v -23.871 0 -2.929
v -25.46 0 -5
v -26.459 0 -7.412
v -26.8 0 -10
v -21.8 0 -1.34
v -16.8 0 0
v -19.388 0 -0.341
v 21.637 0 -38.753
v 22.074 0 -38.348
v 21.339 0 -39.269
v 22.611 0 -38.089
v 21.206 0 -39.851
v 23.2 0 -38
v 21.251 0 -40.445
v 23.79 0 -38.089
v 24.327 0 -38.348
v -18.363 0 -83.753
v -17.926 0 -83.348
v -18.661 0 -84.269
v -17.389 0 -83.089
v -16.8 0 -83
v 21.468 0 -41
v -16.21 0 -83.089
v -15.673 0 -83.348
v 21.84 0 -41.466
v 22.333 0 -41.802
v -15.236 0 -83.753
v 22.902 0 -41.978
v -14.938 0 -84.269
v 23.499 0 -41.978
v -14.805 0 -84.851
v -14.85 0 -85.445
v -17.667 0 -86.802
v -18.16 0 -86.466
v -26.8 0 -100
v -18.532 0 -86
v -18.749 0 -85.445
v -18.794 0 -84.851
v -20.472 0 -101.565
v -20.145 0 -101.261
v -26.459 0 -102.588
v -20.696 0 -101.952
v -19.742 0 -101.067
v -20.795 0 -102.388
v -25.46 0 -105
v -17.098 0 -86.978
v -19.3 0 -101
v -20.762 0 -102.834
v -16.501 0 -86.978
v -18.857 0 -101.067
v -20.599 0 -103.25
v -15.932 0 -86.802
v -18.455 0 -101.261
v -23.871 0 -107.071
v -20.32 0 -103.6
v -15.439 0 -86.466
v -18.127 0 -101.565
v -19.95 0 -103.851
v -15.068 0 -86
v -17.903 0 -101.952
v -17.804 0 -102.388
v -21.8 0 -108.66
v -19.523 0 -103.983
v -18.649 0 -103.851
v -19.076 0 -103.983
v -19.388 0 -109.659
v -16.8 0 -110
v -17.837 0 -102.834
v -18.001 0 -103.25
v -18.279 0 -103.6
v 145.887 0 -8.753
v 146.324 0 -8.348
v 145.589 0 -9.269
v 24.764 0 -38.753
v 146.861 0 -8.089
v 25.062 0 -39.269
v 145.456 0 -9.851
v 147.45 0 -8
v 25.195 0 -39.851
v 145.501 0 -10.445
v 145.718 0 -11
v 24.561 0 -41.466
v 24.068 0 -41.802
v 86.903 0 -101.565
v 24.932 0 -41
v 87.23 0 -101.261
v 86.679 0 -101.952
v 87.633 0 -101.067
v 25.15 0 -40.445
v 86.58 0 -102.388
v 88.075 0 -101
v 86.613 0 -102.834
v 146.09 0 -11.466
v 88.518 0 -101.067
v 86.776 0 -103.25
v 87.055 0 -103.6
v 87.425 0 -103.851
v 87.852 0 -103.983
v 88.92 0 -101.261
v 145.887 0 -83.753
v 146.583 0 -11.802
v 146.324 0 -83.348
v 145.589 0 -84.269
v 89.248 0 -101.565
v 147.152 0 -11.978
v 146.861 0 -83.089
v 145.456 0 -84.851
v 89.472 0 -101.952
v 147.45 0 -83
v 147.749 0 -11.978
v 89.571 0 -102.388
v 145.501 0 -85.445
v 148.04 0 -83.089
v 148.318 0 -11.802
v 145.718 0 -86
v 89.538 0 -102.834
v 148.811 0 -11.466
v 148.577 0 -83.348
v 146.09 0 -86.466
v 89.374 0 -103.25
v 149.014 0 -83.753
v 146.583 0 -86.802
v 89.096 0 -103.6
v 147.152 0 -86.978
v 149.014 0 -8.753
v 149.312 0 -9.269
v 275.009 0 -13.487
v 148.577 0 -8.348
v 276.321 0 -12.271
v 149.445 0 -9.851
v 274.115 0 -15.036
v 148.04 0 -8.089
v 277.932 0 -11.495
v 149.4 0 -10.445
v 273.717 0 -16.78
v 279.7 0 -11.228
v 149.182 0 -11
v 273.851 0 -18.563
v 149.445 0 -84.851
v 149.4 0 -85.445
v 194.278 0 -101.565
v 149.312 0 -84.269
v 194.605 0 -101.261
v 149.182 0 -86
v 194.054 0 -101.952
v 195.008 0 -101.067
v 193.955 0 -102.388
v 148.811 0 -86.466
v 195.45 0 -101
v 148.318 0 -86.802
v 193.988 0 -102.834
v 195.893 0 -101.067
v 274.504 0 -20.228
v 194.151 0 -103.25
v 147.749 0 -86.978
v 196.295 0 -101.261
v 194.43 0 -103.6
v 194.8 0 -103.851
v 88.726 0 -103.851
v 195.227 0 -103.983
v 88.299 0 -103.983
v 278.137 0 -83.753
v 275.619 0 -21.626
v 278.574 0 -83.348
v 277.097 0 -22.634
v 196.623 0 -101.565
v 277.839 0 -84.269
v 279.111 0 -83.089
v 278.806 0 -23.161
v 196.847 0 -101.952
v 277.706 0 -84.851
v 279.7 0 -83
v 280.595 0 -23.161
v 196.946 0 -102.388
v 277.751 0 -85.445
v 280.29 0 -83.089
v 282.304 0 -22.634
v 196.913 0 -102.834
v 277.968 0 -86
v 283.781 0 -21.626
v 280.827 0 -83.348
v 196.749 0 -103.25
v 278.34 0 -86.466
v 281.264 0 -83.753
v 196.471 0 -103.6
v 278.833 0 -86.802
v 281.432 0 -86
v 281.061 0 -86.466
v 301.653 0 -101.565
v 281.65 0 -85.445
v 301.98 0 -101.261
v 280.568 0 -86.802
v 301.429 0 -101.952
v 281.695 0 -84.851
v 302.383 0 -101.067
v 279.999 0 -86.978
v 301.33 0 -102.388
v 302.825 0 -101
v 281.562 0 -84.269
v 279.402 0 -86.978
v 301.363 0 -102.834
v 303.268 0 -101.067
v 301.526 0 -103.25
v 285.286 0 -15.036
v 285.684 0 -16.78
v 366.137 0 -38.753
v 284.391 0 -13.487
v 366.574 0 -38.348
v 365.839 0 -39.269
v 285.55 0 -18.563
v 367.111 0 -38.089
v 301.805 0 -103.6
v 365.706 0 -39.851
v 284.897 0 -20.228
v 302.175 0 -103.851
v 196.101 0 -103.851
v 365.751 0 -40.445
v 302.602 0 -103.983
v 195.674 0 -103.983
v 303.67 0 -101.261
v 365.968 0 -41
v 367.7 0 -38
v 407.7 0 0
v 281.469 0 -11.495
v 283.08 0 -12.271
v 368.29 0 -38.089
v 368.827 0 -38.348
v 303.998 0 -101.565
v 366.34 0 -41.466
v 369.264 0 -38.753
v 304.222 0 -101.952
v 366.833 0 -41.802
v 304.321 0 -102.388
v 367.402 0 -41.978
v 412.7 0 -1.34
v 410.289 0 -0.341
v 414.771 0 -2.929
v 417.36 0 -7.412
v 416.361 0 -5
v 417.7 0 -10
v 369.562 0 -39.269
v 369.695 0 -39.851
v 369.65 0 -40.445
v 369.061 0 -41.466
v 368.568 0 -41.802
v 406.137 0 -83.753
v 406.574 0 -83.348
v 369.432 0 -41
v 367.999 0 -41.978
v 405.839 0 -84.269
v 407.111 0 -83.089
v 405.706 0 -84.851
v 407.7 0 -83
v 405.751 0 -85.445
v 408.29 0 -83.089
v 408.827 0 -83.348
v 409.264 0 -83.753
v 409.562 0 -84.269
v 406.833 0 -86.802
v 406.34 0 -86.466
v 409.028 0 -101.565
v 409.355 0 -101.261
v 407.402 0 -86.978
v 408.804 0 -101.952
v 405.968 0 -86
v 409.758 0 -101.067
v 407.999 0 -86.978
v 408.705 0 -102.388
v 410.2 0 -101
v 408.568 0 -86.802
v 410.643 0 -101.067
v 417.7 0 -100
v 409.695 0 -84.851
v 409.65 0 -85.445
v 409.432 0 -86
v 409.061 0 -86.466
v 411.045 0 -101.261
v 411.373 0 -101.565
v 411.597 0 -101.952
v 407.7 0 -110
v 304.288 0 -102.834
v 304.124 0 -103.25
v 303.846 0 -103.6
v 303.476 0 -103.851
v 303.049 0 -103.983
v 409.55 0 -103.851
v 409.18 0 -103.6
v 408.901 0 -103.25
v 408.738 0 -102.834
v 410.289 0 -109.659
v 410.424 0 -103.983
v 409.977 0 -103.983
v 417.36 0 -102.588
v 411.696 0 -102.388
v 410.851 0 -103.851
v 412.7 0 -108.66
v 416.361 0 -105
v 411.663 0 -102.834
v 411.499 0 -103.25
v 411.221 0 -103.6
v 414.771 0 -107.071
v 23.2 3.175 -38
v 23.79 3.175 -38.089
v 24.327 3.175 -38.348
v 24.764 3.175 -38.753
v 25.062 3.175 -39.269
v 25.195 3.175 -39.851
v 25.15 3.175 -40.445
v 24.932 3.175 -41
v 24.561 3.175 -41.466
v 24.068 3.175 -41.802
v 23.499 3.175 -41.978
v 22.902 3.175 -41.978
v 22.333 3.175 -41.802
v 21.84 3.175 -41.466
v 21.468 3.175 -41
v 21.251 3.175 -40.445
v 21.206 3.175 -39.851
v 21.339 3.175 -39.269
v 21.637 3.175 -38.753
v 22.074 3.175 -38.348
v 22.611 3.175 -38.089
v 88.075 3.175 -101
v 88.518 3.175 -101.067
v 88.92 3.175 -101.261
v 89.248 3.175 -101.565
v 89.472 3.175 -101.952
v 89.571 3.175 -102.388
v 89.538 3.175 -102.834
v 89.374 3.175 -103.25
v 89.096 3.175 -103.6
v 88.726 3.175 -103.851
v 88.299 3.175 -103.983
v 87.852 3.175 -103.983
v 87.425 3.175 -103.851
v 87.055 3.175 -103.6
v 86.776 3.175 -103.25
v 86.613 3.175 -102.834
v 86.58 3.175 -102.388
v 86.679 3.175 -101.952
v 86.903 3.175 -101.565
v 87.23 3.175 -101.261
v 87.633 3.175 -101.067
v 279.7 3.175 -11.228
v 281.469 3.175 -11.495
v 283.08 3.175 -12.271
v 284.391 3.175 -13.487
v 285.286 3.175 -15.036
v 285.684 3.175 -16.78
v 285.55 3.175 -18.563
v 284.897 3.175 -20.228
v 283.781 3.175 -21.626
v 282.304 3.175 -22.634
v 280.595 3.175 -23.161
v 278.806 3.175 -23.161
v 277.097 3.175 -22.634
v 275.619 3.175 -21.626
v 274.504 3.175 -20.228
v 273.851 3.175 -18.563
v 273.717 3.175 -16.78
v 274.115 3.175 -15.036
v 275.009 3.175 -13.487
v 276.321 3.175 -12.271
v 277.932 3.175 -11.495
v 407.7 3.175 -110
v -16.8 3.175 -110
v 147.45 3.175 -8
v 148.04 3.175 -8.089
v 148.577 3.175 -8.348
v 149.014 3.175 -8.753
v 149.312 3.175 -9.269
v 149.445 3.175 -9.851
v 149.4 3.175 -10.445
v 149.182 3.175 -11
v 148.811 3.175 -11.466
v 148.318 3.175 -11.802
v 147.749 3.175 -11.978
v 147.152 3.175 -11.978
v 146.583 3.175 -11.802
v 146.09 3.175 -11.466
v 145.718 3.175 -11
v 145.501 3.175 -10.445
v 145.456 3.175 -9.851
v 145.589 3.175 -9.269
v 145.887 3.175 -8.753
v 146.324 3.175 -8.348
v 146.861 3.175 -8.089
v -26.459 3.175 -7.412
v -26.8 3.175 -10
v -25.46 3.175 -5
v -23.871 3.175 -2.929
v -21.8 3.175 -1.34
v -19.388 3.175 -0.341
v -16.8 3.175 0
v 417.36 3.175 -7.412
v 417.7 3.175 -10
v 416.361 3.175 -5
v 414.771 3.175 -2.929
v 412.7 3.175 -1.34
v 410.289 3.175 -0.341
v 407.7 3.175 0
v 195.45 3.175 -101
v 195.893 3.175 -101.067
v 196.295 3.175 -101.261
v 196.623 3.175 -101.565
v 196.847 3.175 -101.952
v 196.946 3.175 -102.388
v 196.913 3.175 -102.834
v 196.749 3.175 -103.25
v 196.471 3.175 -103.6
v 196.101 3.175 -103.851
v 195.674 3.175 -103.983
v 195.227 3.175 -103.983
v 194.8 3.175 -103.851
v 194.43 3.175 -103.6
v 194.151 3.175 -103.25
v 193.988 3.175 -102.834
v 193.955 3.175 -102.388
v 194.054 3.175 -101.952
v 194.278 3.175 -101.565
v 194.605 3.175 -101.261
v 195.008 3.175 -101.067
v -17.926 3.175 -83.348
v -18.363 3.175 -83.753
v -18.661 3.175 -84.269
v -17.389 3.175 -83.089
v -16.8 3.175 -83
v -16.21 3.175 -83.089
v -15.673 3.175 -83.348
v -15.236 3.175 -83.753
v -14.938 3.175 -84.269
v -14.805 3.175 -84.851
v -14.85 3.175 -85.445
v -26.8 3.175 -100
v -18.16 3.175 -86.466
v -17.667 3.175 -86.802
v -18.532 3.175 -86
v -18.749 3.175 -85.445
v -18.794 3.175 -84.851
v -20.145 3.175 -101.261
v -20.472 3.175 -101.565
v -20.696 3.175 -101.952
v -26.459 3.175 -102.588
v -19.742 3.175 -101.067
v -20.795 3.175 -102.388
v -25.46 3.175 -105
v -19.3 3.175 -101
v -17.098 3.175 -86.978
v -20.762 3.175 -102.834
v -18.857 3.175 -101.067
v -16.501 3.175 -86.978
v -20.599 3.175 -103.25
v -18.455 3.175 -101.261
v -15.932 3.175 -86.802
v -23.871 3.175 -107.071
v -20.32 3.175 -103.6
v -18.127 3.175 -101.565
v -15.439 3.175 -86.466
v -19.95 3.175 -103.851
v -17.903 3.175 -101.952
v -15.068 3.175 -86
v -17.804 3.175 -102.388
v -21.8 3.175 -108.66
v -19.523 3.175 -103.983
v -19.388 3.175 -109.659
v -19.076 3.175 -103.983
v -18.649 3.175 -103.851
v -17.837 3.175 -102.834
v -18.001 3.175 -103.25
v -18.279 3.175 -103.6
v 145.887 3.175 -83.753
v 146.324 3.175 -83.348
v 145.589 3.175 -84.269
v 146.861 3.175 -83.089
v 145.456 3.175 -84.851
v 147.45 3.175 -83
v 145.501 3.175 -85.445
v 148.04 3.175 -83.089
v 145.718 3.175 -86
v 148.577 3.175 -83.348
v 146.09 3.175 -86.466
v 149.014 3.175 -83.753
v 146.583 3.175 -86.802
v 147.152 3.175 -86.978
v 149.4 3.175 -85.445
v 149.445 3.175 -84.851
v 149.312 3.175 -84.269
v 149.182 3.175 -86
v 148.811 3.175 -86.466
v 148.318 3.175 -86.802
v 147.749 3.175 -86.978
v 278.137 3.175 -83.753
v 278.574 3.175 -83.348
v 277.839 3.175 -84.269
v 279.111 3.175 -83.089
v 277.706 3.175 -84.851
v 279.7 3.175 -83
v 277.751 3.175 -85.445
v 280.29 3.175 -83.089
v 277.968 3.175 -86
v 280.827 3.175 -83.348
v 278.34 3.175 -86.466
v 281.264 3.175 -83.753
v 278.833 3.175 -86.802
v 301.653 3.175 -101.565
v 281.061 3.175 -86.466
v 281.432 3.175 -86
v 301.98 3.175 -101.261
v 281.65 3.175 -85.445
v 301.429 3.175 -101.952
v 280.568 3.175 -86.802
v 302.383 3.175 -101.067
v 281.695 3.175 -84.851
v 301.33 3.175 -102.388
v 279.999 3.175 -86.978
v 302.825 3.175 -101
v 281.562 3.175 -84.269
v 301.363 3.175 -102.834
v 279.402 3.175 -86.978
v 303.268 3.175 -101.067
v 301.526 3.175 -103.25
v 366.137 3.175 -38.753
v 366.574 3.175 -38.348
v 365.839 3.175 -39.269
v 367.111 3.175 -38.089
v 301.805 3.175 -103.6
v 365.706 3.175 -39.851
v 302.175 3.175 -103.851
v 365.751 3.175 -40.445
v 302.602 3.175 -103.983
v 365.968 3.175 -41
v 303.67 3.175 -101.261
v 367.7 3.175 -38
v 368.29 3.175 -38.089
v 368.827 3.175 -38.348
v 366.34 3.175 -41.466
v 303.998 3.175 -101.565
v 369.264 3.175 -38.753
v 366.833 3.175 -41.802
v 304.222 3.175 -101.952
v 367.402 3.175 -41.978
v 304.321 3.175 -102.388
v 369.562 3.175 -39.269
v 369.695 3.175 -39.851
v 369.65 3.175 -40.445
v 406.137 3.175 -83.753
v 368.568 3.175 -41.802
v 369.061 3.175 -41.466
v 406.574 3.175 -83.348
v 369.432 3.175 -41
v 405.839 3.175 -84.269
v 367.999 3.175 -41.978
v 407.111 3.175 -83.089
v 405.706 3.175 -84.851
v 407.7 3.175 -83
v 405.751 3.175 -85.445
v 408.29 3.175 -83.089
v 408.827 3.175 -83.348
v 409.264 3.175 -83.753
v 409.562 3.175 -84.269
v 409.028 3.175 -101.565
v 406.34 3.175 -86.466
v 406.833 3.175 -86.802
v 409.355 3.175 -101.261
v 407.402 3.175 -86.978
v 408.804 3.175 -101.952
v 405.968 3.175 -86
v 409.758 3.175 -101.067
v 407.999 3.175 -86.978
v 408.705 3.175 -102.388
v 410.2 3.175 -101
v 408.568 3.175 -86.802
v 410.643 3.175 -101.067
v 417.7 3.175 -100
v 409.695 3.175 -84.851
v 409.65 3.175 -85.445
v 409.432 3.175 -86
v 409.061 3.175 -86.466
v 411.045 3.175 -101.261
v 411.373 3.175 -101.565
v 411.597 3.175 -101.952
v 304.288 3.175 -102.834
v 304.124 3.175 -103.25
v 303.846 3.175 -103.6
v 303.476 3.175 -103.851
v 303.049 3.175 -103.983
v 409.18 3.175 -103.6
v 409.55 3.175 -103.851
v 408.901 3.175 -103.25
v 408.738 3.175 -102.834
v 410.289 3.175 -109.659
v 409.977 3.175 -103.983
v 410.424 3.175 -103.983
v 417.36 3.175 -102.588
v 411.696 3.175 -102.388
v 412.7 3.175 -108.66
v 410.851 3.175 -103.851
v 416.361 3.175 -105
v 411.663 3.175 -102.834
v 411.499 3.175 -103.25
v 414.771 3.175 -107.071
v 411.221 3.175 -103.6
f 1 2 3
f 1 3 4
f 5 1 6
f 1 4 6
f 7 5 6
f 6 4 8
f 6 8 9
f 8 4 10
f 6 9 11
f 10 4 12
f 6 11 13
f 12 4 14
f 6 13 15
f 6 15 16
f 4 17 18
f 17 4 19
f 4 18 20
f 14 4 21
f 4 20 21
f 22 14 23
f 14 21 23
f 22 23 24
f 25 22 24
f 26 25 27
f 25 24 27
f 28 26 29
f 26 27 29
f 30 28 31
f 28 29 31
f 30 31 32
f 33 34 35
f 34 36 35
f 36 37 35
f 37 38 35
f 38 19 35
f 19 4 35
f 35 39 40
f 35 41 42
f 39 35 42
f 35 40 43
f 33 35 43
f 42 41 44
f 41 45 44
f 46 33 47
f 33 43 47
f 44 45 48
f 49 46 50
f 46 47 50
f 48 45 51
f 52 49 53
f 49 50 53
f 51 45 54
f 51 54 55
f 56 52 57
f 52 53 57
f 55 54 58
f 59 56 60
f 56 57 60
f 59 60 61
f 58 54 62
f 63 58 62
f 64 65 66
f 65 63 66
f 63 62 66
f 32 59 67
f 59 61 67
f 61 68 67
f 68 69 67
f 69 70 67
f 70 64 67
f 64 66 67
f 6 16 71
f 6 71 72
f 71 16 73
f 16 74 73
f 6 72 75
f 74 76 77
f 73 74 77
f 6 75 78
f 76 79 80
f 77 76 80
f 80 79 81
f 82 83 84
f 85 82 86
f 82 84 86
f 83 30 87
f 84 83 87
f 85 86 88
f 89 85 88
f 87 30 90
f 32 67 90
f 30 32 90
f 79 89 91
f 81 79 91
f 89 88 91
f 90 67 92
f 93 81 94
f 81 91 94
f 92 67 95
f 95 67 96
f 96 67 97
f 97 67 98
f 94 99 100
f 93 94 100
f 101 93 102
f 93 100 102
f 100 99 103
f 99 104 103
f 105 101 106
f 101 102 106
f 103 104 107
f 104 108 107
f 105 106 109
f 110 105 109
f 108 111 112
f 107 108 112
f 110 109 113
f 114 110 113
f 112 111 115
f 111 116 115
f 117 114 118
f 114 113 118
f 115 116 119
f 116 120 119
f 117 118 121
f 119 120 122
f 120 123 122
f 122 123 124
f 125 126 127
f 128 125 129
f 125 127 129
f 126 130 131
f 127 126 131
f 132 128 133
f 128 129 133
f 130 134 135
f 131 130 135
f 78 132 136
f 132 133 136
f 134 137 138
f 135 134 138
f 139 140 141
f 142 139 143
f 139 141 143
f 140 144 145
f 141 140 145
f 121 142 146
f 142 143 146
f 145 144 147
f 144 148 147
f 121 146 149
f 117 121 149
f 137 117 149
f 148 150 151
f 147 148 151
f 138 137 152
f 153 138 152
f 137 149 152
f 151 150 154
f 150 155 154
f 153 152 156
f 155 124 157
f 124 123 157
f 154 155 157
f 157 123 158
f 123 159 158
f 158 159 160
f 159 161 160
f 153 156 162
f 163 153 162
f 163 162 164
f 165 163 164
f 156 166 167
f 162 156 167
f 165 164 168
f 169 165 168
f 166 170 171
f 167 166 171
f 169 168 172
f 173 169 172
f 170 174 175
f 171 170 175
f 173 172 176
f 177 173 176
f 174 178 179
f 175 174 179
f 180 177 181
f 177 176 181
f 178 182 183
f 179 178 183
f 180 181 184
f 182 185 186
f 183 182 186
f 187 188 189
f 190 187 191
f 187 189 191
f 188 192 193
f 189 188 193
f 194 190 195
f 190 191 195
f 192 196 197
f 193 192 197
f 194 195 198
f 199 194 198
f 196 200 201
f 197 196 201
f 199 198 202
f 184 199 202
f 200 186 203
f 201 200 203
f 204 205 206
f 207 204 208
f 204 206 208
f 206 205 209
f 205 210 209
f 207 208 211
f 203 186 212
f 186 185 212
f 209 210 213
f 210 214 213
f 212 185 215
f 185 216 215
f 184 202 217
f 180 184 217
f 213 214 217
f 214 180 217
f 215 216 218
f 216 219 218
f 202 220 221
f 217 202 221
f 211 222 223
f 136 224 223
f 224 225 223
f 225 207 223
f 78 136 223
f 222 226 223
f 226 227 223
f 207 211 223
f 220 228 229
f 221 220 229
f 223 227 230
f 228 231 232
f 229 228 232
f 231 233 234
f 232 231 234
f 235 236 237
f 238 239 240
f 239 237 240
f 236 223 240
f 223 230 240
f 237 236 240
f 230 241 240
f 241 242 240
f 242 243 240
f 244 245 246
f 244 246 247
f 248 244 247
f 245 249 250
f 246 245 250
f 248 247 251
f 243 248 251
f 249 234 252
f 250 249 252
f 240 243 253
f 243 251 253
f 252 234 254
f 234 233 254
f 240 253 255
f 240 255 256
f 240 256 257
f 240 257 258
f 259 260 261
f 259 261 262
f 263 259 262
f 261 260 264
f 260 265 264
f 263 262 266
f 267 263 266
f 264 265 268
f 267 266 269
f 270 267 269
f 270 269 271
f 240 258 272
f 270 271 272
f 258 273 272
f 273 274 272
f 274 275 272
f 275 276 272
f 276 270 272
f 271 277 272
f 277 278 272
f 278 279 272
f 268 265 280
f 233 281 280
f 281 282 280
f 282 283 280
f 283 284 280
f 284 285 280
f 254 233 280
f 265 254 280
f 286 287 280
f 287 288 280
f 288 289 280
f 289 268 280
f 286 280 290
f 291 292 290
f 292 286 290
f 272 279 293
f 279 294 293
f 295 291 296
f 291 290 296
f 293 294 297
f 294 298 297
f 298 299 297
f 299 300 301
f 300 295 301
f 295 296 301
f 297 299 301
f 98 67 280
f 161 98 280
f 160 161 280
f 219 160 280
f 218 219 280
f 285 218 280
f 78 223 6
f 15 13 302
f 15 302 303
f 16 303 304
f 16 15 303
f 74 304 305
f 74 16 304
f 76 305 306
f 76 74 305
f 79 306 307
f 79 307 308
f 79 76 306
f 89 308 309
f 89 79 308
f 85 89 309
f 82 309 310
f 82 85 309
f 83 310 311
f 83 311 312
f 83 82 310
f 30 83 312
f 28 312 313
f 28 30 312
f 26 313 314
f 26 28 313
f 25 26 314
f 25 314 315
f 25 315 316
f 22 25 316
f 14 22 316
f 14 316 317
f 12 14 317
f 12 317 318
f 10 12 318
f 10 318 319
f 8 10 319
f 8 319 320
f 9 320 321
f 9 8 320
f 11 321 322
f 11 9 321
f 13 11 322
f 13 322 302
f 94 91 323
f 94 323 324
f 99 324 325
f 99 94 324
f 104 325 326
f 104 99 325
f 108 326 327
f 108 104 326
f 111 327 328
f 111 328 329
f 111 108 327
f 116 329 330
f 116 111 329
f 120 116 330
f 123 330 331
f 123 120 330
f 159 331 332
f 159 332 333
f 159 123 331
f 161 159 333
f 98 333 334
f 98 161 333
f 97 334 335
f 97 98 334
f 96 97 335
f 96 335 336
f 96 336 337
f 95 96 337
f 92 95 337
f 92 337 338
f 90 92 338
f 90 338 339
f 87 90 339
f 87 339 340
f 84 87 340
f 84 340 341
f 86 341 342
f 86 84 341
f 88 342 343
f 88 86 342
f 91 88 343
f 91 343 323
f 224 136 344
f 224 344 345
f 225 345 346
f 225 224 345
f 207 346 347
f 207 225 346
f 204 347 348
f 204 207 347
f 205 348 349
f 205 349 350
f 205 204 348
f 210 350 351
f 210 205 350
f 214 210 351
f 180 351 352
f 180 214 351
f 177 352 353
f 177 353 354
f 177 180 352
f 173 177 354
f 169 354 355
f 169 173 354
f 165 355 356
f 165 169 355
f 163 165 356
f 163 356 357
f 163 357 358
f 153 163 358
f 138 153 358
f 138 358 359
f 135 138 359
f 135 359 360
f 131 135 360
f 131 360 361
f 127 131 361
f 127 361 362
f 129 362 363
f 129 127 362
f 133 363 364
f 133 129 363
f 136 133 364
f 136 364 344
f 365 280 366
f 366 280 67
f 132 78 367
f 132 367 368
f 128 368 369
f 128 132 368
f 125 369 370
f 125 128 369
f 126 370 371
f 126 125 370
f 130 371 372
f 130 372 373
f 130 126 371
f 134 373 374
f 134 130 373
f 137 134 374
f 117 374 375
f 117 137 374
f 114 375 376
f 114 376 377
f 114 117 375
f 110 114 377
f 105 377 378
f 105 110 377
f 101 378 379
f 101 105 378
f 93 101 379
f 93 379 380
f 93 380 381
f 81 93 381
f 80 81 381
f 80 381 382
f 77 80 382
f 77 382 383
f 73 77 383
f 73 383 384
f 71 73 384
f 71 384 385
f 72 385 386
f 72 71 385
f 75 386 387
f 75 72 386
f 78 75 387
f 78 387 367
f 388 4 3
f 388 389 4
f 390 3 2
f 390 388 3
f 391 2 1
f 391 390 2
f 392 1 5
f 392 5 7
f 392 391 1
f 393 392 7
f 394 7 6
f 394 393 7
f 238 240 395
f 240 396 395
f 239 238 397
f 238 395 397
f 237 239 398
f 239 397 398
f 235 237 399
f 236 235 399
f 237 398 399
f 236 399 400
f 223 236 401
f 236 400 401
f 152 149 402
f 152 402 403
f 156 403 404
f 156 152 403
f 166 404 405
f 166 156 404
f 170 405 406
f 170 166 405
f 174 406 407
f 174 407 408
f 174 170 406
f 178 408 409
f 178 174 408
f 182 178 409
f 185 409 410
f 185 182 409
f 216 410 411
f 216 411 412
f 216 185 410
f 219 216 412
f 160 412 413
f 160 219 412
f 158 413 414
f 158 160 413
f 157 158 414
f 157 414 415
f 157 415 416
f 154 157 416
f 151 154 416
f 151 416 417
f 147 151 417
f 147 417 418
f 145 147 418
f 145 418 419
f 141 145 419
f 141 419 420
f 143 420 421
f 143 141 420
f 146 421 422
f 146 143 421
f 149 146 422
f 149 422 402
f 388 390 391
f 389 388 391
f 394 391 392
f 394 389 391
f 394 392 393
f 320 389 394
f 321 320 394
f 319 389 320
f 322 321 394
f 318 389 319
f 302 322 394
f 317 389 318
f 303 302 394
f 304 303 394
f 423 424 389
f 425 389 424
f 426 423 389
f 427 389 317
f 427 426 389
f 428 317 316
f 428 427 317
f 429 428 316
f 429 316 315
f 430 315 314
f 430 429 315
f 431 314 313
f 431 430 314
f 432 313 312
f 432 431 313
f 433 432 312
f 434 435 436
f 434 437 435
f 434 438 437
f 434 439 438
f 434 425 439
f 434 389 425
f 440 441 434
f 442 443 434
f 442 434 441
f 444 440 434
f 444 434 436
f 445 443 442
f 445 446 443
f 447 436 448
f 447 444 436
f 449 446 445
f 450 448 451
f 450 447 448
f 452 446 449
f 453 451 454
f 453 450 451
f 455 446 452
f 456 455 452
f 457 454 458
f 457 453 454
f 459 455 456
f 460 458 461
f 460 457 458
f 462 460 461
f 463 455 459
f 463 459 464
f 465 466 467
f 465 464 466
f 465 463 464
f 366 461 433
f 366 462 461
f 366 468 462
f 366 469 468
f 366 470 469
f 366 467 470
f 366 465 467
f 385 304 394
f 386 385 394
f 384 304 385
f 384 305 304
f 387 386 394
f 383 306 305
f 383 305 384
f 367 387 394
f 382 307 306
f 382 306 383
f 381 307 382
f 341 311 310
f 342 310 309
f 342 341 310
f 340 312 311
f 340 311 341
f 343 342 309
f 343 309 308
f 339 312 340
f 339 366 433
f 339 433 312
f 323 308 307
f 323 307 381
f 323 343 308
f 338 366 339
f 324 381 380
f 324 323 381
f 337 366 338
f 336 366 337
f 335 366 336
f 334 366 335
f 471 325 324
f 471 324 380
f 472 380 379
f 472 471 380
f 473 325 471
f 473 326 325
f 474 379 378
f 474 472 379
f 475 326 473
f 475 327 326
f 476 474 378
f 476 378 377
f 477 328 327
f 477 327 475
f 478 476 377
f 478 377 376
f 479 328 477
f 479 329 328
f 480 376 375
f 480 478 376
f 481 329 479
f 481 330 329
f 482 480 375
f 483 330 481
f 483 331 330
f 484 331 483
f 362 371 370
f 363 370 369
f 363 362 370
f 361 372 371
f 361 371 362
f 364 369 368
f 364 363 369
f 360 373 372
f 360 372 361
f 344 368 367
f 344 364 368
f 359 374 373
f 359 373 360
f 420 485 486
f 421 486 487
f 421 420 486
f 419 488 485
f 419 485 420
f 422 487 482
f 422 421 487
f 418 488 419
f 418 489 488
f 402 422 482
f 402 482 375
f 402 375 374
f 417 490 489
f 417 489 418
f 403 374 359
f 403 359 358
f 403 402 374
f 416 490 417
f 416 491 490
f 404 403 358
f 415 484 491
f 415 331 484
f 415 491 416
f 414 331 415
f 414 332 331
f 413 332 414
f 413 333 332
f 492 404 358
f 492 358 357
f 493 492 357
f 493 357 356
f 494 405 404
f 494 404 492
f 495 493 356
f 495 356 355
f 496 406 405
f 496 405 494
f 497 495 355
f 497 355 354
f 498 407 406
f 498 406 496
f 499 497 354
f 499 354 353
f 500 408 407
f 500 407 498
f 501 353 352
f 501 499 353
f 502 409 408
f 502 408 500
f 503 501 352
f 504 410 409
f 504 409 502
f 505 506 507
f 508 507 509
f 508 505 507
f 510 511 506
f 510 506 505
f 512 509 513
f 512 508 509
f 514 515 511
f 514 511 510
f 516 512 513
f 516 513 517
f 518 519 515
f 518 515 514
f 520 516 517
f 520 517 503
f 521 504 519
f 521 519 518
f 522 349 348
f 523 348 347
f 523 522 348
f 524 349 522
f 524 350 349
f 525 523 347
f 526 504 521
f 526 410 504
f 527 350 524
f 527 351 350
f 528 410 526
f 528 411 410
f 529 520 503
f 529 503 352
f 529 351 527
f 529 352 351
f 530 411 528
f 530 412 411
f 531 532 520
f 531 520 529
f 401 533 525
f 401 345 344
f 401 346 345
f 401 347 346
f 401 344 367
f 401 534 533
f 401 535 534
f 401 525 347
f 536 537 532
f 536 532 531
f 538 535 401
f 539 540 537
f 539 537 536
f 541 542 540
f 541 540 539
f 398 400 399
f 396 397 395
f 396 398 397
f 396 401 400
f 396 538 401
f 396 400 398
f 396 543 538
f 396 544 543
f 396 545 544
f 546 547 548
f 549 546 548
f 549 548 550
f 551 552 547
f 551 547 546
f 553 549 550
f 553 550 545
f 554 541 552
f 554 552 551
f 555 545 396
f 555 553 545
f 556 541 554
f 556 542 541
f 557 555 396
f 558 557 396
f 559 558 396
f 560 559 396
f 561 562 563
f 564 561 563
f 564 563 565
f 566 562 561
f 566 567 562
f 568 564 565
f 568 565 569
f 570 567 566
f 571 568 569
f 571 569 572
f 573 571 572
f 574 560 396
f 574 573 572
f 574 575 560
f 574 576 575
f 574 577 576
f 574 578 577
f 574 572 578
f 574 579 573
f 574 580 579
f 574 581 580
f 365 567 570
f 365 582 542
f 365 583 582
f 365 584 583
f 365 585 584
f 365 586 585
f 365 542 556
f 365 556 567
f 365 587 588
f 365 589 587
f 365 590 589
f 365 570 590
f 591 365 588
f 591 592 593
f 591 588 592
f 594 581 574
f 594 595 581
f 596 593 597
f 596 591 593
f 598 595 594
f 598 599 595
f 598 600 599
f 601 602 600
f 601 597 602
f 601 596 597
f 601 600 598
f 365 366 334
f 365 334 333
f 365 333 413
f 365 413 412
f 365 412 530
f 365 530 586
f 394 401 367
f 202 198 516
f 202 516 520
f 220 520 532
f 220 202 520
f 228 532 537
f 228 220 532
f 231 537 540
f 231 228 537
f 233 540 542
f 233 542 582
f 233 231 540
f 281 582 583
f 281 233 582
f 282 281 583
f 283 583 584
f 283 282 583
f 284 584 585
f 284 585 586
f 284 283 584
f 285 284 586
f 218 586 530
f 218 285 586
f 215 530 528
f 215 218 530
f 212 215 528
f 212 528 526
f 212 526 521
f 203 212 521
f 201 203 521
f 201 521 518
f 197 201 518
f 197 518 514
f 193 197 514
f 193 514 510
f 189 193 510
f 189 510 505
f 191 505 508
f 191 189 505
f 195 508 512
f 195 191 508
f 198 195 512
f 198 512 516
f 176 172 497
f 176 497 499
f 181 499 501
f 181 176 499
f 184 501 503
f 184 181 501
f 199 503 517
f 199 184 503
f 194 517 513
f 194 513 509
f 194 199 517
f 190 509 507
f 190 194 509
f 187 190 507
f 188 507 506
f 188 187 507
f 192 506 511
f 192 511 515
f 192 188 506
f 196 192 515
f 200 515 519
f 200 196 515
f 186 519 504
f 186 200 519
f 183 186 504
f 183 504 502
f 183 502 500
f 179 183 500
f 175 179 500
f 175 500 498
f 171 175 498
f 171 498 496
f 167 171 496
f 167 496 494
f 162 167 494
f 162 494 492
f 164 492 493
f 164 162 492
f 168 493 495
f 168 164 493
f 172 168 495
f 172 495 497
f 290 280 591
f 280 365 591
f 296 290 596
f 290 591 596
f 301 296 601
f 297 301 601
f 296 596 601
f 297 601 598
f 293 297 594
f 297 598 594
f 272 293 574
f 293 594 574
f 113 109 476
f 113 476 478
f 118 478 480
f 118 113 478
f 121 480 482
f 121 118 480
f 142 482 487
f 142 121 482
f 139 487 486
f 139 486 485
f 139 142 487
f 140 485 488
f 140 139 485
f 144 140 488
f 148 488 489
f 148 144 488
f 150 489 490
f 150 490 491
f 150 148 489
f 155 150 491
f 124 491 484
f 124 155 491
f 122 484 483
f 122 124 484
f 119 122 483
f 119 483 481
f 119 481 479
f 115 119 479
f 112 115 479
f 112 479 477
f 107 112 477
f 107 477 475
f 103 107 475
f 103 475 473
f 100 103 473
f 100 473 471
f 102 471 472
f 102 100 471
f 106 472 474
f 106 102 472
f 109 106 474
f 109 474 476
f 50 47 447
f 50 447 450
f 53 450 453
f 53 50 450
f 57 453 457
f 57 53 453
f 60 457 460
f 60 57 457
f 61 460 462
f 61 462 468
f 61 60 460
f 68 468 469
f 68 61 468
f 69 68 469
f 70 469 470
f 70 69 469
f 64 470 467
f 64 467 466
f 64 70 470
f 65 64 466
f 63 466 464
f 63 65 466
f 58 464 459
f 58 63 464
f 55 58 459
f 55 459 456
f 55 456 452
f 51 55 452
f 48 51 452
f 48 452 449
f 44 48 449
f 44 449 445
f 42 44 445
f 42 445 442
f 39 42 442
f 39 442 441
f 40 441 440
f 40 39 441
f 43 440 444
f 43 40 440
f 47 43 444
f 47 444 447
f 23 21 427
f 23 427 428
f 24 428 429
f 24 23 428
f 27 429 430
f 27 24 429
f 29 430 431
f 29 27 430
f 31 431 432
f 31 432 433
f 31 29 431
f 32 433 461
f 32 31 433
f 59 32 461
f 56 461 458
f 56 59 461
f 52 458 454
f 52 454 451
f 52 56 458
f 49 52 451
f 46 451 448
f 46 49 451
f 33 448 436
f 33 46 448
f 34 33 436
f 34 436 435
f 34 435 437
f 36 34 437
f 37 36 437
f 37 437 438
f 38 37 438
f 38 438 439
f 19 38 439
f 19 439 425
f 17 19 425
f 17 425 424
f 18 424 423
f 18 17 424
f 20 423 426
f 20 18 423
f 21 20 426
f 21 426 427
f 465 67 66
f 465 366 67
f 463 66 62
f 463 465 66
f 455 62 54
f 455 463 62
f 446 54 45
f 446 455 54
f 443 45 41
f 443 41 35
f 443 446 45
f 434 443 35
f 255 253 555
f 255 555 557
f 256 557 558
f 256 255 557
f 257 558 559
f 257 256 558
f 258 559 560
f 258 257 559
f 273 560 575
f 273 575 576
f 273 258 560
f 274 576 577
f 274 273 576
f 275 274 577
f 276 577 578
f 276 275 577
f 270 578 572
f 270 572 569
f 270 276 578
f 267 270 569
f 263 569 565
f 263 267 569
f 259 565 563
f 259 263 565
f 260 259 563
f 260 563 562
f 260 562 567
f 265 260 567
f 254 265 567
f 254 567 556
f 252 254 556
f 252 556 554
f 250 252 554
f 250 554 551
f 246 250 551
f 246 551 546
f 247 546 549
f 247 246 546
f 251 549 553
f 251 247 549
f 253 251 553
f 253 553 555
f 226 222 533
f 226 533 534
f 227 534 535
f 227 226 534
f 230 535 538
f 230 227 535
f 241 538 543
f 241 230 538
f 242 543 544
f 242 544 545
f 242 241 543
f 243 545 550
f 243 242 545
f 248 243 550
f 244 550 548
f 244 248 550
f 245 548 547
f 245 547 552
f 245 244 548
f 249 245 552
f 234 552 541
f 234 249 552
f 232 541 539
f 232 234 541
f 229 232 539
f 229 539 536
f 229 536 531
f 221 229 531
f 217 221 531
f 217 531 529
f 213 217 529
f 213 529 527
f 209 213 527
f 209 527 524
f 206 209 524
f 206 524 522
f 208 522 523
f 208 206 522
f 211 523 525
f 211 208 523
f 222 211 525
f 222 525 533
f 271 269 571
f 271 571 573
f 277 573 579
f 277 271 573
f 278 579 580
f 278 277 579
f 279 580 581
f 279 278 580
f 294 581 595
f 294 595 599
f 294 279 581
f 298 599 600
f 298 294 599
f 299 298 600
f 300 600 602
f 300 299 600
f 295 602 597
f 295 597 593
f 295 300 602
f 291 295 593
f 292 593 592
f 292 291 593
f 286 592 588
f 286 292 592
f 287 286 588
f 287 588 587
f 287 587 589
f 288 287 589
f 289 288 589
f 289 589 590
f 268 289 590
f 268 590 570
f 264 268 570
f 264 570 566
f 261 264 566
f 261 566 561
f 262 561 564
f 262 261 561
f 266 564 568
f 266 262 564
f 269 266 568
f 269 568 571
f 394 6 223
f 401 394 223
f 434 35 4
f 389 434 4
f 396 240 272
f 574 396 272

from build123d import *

# Parameters (mm, degrees)
SKETCH1_R           = 2
SKETCH1_R_2         = 6
SKETCH1_R_3         = 1.5
BOSS_EXTRUDE1_DEPTH = 3.175
FILLET1_R           = 10


with BuildPart() as part:
    # Sketch1 → Boss-Extrude1 (new body)
    with BuildSketch(Plane(origin=(0, 0, 0), x_dir=(1, 0, 0), z_dir=(0, 1, 0))):
        Polygon((417.700422465, 110), (-26.799577535, 110), (-26.799577535, 0), (417.700422465, 0), (417.700422465, 17.22815868), align=None)
        with Locations(Location((147.450422465, 10, 0), (0, 0, 270))):
            Circle(SKETCH1_R, mode=Mode.SUBTRACT)
        with Locations(Location((23.200422465, 40, 0), (0, 0, 270))):
            Circle(SKETCH1_R, mode=Mode.SUBTRACT)
        with Locations(Location((279.700422465, 17.22815868, 0), (0, 0, 270))):
            Circle(SKETCH1_R_2, mode=Mode.SUBTRACT)
        with Locations(Location((367.700422465, 40, 0), (0, 0, 270))):
            Circle(SKETCH1_R, mode=Mode.SUBTRACT)
        with Locations(Location((-16.799577535, 85, 0), (0, 0, 270))):
            Circle(SKETCH1_R, mode=Mode.SUBTRACT)
        with Locations(Location((-19.299577535, 102.5, 0), (0, 0, 270))):
            Circle(SKETCH1_R_3, mode=Mode.SUBTRACT)
        with Locations(Location((88.075422465, 102.5, 0), (0, 0, 270))):
            Circle(SKETCH1_R_3, mode=Mode.SUBTRACT)
        with Locations(Location((147.450422465, 85, 0), (0, 0, 270))):
            Circle(SKETCH1_R, mode=Mode.SUBTRACT)
        with Locations(Location((279.700422465, 85, 0), (0, 0, 270))):
            Circle(SKETCH1_R, mode=Mode.SUBTRACT)
        with Locations(Location((195.450422465, 102.5, 0), (0, 0, 270))):
            Circle(SKETCH1_R_3, mode=Mode.SUBTRACT)
        with Locations(Location((302.825422465, 102.5, 0), (0, 0, 270))):
            Circle(SKETCH1_R_3, mode=Mode.SUBTRACT)
        with Locations(Location((407.700422465, 85, 0), (0, 0, 270))):
            Circle(SKETCH1_R, mode=Mode.SUBTRACT)
        with Locations(Location((410.200422465, 102.5, 0), (0, 0, 270))):
            Circle(SKETCH1_R_3, mode=Mode.SUBTRACT)
    extrude(amount=BOSS_EXTRUDE1_DEPTH)

    # Fillet1
    fillet1_edges = [part.edges().sort_by_distance(p)[0] for p in [
        (-26.799577535, 1.5875, -110),
        (417.700422465, 1.5875, -110),
        (417.700422465, 1.5875, 0),
        (-26.799577535, 1.5875, 0),
    ]]
    fillet(fillet1_edges, radius=FILLET1_R)


solid = part.part
